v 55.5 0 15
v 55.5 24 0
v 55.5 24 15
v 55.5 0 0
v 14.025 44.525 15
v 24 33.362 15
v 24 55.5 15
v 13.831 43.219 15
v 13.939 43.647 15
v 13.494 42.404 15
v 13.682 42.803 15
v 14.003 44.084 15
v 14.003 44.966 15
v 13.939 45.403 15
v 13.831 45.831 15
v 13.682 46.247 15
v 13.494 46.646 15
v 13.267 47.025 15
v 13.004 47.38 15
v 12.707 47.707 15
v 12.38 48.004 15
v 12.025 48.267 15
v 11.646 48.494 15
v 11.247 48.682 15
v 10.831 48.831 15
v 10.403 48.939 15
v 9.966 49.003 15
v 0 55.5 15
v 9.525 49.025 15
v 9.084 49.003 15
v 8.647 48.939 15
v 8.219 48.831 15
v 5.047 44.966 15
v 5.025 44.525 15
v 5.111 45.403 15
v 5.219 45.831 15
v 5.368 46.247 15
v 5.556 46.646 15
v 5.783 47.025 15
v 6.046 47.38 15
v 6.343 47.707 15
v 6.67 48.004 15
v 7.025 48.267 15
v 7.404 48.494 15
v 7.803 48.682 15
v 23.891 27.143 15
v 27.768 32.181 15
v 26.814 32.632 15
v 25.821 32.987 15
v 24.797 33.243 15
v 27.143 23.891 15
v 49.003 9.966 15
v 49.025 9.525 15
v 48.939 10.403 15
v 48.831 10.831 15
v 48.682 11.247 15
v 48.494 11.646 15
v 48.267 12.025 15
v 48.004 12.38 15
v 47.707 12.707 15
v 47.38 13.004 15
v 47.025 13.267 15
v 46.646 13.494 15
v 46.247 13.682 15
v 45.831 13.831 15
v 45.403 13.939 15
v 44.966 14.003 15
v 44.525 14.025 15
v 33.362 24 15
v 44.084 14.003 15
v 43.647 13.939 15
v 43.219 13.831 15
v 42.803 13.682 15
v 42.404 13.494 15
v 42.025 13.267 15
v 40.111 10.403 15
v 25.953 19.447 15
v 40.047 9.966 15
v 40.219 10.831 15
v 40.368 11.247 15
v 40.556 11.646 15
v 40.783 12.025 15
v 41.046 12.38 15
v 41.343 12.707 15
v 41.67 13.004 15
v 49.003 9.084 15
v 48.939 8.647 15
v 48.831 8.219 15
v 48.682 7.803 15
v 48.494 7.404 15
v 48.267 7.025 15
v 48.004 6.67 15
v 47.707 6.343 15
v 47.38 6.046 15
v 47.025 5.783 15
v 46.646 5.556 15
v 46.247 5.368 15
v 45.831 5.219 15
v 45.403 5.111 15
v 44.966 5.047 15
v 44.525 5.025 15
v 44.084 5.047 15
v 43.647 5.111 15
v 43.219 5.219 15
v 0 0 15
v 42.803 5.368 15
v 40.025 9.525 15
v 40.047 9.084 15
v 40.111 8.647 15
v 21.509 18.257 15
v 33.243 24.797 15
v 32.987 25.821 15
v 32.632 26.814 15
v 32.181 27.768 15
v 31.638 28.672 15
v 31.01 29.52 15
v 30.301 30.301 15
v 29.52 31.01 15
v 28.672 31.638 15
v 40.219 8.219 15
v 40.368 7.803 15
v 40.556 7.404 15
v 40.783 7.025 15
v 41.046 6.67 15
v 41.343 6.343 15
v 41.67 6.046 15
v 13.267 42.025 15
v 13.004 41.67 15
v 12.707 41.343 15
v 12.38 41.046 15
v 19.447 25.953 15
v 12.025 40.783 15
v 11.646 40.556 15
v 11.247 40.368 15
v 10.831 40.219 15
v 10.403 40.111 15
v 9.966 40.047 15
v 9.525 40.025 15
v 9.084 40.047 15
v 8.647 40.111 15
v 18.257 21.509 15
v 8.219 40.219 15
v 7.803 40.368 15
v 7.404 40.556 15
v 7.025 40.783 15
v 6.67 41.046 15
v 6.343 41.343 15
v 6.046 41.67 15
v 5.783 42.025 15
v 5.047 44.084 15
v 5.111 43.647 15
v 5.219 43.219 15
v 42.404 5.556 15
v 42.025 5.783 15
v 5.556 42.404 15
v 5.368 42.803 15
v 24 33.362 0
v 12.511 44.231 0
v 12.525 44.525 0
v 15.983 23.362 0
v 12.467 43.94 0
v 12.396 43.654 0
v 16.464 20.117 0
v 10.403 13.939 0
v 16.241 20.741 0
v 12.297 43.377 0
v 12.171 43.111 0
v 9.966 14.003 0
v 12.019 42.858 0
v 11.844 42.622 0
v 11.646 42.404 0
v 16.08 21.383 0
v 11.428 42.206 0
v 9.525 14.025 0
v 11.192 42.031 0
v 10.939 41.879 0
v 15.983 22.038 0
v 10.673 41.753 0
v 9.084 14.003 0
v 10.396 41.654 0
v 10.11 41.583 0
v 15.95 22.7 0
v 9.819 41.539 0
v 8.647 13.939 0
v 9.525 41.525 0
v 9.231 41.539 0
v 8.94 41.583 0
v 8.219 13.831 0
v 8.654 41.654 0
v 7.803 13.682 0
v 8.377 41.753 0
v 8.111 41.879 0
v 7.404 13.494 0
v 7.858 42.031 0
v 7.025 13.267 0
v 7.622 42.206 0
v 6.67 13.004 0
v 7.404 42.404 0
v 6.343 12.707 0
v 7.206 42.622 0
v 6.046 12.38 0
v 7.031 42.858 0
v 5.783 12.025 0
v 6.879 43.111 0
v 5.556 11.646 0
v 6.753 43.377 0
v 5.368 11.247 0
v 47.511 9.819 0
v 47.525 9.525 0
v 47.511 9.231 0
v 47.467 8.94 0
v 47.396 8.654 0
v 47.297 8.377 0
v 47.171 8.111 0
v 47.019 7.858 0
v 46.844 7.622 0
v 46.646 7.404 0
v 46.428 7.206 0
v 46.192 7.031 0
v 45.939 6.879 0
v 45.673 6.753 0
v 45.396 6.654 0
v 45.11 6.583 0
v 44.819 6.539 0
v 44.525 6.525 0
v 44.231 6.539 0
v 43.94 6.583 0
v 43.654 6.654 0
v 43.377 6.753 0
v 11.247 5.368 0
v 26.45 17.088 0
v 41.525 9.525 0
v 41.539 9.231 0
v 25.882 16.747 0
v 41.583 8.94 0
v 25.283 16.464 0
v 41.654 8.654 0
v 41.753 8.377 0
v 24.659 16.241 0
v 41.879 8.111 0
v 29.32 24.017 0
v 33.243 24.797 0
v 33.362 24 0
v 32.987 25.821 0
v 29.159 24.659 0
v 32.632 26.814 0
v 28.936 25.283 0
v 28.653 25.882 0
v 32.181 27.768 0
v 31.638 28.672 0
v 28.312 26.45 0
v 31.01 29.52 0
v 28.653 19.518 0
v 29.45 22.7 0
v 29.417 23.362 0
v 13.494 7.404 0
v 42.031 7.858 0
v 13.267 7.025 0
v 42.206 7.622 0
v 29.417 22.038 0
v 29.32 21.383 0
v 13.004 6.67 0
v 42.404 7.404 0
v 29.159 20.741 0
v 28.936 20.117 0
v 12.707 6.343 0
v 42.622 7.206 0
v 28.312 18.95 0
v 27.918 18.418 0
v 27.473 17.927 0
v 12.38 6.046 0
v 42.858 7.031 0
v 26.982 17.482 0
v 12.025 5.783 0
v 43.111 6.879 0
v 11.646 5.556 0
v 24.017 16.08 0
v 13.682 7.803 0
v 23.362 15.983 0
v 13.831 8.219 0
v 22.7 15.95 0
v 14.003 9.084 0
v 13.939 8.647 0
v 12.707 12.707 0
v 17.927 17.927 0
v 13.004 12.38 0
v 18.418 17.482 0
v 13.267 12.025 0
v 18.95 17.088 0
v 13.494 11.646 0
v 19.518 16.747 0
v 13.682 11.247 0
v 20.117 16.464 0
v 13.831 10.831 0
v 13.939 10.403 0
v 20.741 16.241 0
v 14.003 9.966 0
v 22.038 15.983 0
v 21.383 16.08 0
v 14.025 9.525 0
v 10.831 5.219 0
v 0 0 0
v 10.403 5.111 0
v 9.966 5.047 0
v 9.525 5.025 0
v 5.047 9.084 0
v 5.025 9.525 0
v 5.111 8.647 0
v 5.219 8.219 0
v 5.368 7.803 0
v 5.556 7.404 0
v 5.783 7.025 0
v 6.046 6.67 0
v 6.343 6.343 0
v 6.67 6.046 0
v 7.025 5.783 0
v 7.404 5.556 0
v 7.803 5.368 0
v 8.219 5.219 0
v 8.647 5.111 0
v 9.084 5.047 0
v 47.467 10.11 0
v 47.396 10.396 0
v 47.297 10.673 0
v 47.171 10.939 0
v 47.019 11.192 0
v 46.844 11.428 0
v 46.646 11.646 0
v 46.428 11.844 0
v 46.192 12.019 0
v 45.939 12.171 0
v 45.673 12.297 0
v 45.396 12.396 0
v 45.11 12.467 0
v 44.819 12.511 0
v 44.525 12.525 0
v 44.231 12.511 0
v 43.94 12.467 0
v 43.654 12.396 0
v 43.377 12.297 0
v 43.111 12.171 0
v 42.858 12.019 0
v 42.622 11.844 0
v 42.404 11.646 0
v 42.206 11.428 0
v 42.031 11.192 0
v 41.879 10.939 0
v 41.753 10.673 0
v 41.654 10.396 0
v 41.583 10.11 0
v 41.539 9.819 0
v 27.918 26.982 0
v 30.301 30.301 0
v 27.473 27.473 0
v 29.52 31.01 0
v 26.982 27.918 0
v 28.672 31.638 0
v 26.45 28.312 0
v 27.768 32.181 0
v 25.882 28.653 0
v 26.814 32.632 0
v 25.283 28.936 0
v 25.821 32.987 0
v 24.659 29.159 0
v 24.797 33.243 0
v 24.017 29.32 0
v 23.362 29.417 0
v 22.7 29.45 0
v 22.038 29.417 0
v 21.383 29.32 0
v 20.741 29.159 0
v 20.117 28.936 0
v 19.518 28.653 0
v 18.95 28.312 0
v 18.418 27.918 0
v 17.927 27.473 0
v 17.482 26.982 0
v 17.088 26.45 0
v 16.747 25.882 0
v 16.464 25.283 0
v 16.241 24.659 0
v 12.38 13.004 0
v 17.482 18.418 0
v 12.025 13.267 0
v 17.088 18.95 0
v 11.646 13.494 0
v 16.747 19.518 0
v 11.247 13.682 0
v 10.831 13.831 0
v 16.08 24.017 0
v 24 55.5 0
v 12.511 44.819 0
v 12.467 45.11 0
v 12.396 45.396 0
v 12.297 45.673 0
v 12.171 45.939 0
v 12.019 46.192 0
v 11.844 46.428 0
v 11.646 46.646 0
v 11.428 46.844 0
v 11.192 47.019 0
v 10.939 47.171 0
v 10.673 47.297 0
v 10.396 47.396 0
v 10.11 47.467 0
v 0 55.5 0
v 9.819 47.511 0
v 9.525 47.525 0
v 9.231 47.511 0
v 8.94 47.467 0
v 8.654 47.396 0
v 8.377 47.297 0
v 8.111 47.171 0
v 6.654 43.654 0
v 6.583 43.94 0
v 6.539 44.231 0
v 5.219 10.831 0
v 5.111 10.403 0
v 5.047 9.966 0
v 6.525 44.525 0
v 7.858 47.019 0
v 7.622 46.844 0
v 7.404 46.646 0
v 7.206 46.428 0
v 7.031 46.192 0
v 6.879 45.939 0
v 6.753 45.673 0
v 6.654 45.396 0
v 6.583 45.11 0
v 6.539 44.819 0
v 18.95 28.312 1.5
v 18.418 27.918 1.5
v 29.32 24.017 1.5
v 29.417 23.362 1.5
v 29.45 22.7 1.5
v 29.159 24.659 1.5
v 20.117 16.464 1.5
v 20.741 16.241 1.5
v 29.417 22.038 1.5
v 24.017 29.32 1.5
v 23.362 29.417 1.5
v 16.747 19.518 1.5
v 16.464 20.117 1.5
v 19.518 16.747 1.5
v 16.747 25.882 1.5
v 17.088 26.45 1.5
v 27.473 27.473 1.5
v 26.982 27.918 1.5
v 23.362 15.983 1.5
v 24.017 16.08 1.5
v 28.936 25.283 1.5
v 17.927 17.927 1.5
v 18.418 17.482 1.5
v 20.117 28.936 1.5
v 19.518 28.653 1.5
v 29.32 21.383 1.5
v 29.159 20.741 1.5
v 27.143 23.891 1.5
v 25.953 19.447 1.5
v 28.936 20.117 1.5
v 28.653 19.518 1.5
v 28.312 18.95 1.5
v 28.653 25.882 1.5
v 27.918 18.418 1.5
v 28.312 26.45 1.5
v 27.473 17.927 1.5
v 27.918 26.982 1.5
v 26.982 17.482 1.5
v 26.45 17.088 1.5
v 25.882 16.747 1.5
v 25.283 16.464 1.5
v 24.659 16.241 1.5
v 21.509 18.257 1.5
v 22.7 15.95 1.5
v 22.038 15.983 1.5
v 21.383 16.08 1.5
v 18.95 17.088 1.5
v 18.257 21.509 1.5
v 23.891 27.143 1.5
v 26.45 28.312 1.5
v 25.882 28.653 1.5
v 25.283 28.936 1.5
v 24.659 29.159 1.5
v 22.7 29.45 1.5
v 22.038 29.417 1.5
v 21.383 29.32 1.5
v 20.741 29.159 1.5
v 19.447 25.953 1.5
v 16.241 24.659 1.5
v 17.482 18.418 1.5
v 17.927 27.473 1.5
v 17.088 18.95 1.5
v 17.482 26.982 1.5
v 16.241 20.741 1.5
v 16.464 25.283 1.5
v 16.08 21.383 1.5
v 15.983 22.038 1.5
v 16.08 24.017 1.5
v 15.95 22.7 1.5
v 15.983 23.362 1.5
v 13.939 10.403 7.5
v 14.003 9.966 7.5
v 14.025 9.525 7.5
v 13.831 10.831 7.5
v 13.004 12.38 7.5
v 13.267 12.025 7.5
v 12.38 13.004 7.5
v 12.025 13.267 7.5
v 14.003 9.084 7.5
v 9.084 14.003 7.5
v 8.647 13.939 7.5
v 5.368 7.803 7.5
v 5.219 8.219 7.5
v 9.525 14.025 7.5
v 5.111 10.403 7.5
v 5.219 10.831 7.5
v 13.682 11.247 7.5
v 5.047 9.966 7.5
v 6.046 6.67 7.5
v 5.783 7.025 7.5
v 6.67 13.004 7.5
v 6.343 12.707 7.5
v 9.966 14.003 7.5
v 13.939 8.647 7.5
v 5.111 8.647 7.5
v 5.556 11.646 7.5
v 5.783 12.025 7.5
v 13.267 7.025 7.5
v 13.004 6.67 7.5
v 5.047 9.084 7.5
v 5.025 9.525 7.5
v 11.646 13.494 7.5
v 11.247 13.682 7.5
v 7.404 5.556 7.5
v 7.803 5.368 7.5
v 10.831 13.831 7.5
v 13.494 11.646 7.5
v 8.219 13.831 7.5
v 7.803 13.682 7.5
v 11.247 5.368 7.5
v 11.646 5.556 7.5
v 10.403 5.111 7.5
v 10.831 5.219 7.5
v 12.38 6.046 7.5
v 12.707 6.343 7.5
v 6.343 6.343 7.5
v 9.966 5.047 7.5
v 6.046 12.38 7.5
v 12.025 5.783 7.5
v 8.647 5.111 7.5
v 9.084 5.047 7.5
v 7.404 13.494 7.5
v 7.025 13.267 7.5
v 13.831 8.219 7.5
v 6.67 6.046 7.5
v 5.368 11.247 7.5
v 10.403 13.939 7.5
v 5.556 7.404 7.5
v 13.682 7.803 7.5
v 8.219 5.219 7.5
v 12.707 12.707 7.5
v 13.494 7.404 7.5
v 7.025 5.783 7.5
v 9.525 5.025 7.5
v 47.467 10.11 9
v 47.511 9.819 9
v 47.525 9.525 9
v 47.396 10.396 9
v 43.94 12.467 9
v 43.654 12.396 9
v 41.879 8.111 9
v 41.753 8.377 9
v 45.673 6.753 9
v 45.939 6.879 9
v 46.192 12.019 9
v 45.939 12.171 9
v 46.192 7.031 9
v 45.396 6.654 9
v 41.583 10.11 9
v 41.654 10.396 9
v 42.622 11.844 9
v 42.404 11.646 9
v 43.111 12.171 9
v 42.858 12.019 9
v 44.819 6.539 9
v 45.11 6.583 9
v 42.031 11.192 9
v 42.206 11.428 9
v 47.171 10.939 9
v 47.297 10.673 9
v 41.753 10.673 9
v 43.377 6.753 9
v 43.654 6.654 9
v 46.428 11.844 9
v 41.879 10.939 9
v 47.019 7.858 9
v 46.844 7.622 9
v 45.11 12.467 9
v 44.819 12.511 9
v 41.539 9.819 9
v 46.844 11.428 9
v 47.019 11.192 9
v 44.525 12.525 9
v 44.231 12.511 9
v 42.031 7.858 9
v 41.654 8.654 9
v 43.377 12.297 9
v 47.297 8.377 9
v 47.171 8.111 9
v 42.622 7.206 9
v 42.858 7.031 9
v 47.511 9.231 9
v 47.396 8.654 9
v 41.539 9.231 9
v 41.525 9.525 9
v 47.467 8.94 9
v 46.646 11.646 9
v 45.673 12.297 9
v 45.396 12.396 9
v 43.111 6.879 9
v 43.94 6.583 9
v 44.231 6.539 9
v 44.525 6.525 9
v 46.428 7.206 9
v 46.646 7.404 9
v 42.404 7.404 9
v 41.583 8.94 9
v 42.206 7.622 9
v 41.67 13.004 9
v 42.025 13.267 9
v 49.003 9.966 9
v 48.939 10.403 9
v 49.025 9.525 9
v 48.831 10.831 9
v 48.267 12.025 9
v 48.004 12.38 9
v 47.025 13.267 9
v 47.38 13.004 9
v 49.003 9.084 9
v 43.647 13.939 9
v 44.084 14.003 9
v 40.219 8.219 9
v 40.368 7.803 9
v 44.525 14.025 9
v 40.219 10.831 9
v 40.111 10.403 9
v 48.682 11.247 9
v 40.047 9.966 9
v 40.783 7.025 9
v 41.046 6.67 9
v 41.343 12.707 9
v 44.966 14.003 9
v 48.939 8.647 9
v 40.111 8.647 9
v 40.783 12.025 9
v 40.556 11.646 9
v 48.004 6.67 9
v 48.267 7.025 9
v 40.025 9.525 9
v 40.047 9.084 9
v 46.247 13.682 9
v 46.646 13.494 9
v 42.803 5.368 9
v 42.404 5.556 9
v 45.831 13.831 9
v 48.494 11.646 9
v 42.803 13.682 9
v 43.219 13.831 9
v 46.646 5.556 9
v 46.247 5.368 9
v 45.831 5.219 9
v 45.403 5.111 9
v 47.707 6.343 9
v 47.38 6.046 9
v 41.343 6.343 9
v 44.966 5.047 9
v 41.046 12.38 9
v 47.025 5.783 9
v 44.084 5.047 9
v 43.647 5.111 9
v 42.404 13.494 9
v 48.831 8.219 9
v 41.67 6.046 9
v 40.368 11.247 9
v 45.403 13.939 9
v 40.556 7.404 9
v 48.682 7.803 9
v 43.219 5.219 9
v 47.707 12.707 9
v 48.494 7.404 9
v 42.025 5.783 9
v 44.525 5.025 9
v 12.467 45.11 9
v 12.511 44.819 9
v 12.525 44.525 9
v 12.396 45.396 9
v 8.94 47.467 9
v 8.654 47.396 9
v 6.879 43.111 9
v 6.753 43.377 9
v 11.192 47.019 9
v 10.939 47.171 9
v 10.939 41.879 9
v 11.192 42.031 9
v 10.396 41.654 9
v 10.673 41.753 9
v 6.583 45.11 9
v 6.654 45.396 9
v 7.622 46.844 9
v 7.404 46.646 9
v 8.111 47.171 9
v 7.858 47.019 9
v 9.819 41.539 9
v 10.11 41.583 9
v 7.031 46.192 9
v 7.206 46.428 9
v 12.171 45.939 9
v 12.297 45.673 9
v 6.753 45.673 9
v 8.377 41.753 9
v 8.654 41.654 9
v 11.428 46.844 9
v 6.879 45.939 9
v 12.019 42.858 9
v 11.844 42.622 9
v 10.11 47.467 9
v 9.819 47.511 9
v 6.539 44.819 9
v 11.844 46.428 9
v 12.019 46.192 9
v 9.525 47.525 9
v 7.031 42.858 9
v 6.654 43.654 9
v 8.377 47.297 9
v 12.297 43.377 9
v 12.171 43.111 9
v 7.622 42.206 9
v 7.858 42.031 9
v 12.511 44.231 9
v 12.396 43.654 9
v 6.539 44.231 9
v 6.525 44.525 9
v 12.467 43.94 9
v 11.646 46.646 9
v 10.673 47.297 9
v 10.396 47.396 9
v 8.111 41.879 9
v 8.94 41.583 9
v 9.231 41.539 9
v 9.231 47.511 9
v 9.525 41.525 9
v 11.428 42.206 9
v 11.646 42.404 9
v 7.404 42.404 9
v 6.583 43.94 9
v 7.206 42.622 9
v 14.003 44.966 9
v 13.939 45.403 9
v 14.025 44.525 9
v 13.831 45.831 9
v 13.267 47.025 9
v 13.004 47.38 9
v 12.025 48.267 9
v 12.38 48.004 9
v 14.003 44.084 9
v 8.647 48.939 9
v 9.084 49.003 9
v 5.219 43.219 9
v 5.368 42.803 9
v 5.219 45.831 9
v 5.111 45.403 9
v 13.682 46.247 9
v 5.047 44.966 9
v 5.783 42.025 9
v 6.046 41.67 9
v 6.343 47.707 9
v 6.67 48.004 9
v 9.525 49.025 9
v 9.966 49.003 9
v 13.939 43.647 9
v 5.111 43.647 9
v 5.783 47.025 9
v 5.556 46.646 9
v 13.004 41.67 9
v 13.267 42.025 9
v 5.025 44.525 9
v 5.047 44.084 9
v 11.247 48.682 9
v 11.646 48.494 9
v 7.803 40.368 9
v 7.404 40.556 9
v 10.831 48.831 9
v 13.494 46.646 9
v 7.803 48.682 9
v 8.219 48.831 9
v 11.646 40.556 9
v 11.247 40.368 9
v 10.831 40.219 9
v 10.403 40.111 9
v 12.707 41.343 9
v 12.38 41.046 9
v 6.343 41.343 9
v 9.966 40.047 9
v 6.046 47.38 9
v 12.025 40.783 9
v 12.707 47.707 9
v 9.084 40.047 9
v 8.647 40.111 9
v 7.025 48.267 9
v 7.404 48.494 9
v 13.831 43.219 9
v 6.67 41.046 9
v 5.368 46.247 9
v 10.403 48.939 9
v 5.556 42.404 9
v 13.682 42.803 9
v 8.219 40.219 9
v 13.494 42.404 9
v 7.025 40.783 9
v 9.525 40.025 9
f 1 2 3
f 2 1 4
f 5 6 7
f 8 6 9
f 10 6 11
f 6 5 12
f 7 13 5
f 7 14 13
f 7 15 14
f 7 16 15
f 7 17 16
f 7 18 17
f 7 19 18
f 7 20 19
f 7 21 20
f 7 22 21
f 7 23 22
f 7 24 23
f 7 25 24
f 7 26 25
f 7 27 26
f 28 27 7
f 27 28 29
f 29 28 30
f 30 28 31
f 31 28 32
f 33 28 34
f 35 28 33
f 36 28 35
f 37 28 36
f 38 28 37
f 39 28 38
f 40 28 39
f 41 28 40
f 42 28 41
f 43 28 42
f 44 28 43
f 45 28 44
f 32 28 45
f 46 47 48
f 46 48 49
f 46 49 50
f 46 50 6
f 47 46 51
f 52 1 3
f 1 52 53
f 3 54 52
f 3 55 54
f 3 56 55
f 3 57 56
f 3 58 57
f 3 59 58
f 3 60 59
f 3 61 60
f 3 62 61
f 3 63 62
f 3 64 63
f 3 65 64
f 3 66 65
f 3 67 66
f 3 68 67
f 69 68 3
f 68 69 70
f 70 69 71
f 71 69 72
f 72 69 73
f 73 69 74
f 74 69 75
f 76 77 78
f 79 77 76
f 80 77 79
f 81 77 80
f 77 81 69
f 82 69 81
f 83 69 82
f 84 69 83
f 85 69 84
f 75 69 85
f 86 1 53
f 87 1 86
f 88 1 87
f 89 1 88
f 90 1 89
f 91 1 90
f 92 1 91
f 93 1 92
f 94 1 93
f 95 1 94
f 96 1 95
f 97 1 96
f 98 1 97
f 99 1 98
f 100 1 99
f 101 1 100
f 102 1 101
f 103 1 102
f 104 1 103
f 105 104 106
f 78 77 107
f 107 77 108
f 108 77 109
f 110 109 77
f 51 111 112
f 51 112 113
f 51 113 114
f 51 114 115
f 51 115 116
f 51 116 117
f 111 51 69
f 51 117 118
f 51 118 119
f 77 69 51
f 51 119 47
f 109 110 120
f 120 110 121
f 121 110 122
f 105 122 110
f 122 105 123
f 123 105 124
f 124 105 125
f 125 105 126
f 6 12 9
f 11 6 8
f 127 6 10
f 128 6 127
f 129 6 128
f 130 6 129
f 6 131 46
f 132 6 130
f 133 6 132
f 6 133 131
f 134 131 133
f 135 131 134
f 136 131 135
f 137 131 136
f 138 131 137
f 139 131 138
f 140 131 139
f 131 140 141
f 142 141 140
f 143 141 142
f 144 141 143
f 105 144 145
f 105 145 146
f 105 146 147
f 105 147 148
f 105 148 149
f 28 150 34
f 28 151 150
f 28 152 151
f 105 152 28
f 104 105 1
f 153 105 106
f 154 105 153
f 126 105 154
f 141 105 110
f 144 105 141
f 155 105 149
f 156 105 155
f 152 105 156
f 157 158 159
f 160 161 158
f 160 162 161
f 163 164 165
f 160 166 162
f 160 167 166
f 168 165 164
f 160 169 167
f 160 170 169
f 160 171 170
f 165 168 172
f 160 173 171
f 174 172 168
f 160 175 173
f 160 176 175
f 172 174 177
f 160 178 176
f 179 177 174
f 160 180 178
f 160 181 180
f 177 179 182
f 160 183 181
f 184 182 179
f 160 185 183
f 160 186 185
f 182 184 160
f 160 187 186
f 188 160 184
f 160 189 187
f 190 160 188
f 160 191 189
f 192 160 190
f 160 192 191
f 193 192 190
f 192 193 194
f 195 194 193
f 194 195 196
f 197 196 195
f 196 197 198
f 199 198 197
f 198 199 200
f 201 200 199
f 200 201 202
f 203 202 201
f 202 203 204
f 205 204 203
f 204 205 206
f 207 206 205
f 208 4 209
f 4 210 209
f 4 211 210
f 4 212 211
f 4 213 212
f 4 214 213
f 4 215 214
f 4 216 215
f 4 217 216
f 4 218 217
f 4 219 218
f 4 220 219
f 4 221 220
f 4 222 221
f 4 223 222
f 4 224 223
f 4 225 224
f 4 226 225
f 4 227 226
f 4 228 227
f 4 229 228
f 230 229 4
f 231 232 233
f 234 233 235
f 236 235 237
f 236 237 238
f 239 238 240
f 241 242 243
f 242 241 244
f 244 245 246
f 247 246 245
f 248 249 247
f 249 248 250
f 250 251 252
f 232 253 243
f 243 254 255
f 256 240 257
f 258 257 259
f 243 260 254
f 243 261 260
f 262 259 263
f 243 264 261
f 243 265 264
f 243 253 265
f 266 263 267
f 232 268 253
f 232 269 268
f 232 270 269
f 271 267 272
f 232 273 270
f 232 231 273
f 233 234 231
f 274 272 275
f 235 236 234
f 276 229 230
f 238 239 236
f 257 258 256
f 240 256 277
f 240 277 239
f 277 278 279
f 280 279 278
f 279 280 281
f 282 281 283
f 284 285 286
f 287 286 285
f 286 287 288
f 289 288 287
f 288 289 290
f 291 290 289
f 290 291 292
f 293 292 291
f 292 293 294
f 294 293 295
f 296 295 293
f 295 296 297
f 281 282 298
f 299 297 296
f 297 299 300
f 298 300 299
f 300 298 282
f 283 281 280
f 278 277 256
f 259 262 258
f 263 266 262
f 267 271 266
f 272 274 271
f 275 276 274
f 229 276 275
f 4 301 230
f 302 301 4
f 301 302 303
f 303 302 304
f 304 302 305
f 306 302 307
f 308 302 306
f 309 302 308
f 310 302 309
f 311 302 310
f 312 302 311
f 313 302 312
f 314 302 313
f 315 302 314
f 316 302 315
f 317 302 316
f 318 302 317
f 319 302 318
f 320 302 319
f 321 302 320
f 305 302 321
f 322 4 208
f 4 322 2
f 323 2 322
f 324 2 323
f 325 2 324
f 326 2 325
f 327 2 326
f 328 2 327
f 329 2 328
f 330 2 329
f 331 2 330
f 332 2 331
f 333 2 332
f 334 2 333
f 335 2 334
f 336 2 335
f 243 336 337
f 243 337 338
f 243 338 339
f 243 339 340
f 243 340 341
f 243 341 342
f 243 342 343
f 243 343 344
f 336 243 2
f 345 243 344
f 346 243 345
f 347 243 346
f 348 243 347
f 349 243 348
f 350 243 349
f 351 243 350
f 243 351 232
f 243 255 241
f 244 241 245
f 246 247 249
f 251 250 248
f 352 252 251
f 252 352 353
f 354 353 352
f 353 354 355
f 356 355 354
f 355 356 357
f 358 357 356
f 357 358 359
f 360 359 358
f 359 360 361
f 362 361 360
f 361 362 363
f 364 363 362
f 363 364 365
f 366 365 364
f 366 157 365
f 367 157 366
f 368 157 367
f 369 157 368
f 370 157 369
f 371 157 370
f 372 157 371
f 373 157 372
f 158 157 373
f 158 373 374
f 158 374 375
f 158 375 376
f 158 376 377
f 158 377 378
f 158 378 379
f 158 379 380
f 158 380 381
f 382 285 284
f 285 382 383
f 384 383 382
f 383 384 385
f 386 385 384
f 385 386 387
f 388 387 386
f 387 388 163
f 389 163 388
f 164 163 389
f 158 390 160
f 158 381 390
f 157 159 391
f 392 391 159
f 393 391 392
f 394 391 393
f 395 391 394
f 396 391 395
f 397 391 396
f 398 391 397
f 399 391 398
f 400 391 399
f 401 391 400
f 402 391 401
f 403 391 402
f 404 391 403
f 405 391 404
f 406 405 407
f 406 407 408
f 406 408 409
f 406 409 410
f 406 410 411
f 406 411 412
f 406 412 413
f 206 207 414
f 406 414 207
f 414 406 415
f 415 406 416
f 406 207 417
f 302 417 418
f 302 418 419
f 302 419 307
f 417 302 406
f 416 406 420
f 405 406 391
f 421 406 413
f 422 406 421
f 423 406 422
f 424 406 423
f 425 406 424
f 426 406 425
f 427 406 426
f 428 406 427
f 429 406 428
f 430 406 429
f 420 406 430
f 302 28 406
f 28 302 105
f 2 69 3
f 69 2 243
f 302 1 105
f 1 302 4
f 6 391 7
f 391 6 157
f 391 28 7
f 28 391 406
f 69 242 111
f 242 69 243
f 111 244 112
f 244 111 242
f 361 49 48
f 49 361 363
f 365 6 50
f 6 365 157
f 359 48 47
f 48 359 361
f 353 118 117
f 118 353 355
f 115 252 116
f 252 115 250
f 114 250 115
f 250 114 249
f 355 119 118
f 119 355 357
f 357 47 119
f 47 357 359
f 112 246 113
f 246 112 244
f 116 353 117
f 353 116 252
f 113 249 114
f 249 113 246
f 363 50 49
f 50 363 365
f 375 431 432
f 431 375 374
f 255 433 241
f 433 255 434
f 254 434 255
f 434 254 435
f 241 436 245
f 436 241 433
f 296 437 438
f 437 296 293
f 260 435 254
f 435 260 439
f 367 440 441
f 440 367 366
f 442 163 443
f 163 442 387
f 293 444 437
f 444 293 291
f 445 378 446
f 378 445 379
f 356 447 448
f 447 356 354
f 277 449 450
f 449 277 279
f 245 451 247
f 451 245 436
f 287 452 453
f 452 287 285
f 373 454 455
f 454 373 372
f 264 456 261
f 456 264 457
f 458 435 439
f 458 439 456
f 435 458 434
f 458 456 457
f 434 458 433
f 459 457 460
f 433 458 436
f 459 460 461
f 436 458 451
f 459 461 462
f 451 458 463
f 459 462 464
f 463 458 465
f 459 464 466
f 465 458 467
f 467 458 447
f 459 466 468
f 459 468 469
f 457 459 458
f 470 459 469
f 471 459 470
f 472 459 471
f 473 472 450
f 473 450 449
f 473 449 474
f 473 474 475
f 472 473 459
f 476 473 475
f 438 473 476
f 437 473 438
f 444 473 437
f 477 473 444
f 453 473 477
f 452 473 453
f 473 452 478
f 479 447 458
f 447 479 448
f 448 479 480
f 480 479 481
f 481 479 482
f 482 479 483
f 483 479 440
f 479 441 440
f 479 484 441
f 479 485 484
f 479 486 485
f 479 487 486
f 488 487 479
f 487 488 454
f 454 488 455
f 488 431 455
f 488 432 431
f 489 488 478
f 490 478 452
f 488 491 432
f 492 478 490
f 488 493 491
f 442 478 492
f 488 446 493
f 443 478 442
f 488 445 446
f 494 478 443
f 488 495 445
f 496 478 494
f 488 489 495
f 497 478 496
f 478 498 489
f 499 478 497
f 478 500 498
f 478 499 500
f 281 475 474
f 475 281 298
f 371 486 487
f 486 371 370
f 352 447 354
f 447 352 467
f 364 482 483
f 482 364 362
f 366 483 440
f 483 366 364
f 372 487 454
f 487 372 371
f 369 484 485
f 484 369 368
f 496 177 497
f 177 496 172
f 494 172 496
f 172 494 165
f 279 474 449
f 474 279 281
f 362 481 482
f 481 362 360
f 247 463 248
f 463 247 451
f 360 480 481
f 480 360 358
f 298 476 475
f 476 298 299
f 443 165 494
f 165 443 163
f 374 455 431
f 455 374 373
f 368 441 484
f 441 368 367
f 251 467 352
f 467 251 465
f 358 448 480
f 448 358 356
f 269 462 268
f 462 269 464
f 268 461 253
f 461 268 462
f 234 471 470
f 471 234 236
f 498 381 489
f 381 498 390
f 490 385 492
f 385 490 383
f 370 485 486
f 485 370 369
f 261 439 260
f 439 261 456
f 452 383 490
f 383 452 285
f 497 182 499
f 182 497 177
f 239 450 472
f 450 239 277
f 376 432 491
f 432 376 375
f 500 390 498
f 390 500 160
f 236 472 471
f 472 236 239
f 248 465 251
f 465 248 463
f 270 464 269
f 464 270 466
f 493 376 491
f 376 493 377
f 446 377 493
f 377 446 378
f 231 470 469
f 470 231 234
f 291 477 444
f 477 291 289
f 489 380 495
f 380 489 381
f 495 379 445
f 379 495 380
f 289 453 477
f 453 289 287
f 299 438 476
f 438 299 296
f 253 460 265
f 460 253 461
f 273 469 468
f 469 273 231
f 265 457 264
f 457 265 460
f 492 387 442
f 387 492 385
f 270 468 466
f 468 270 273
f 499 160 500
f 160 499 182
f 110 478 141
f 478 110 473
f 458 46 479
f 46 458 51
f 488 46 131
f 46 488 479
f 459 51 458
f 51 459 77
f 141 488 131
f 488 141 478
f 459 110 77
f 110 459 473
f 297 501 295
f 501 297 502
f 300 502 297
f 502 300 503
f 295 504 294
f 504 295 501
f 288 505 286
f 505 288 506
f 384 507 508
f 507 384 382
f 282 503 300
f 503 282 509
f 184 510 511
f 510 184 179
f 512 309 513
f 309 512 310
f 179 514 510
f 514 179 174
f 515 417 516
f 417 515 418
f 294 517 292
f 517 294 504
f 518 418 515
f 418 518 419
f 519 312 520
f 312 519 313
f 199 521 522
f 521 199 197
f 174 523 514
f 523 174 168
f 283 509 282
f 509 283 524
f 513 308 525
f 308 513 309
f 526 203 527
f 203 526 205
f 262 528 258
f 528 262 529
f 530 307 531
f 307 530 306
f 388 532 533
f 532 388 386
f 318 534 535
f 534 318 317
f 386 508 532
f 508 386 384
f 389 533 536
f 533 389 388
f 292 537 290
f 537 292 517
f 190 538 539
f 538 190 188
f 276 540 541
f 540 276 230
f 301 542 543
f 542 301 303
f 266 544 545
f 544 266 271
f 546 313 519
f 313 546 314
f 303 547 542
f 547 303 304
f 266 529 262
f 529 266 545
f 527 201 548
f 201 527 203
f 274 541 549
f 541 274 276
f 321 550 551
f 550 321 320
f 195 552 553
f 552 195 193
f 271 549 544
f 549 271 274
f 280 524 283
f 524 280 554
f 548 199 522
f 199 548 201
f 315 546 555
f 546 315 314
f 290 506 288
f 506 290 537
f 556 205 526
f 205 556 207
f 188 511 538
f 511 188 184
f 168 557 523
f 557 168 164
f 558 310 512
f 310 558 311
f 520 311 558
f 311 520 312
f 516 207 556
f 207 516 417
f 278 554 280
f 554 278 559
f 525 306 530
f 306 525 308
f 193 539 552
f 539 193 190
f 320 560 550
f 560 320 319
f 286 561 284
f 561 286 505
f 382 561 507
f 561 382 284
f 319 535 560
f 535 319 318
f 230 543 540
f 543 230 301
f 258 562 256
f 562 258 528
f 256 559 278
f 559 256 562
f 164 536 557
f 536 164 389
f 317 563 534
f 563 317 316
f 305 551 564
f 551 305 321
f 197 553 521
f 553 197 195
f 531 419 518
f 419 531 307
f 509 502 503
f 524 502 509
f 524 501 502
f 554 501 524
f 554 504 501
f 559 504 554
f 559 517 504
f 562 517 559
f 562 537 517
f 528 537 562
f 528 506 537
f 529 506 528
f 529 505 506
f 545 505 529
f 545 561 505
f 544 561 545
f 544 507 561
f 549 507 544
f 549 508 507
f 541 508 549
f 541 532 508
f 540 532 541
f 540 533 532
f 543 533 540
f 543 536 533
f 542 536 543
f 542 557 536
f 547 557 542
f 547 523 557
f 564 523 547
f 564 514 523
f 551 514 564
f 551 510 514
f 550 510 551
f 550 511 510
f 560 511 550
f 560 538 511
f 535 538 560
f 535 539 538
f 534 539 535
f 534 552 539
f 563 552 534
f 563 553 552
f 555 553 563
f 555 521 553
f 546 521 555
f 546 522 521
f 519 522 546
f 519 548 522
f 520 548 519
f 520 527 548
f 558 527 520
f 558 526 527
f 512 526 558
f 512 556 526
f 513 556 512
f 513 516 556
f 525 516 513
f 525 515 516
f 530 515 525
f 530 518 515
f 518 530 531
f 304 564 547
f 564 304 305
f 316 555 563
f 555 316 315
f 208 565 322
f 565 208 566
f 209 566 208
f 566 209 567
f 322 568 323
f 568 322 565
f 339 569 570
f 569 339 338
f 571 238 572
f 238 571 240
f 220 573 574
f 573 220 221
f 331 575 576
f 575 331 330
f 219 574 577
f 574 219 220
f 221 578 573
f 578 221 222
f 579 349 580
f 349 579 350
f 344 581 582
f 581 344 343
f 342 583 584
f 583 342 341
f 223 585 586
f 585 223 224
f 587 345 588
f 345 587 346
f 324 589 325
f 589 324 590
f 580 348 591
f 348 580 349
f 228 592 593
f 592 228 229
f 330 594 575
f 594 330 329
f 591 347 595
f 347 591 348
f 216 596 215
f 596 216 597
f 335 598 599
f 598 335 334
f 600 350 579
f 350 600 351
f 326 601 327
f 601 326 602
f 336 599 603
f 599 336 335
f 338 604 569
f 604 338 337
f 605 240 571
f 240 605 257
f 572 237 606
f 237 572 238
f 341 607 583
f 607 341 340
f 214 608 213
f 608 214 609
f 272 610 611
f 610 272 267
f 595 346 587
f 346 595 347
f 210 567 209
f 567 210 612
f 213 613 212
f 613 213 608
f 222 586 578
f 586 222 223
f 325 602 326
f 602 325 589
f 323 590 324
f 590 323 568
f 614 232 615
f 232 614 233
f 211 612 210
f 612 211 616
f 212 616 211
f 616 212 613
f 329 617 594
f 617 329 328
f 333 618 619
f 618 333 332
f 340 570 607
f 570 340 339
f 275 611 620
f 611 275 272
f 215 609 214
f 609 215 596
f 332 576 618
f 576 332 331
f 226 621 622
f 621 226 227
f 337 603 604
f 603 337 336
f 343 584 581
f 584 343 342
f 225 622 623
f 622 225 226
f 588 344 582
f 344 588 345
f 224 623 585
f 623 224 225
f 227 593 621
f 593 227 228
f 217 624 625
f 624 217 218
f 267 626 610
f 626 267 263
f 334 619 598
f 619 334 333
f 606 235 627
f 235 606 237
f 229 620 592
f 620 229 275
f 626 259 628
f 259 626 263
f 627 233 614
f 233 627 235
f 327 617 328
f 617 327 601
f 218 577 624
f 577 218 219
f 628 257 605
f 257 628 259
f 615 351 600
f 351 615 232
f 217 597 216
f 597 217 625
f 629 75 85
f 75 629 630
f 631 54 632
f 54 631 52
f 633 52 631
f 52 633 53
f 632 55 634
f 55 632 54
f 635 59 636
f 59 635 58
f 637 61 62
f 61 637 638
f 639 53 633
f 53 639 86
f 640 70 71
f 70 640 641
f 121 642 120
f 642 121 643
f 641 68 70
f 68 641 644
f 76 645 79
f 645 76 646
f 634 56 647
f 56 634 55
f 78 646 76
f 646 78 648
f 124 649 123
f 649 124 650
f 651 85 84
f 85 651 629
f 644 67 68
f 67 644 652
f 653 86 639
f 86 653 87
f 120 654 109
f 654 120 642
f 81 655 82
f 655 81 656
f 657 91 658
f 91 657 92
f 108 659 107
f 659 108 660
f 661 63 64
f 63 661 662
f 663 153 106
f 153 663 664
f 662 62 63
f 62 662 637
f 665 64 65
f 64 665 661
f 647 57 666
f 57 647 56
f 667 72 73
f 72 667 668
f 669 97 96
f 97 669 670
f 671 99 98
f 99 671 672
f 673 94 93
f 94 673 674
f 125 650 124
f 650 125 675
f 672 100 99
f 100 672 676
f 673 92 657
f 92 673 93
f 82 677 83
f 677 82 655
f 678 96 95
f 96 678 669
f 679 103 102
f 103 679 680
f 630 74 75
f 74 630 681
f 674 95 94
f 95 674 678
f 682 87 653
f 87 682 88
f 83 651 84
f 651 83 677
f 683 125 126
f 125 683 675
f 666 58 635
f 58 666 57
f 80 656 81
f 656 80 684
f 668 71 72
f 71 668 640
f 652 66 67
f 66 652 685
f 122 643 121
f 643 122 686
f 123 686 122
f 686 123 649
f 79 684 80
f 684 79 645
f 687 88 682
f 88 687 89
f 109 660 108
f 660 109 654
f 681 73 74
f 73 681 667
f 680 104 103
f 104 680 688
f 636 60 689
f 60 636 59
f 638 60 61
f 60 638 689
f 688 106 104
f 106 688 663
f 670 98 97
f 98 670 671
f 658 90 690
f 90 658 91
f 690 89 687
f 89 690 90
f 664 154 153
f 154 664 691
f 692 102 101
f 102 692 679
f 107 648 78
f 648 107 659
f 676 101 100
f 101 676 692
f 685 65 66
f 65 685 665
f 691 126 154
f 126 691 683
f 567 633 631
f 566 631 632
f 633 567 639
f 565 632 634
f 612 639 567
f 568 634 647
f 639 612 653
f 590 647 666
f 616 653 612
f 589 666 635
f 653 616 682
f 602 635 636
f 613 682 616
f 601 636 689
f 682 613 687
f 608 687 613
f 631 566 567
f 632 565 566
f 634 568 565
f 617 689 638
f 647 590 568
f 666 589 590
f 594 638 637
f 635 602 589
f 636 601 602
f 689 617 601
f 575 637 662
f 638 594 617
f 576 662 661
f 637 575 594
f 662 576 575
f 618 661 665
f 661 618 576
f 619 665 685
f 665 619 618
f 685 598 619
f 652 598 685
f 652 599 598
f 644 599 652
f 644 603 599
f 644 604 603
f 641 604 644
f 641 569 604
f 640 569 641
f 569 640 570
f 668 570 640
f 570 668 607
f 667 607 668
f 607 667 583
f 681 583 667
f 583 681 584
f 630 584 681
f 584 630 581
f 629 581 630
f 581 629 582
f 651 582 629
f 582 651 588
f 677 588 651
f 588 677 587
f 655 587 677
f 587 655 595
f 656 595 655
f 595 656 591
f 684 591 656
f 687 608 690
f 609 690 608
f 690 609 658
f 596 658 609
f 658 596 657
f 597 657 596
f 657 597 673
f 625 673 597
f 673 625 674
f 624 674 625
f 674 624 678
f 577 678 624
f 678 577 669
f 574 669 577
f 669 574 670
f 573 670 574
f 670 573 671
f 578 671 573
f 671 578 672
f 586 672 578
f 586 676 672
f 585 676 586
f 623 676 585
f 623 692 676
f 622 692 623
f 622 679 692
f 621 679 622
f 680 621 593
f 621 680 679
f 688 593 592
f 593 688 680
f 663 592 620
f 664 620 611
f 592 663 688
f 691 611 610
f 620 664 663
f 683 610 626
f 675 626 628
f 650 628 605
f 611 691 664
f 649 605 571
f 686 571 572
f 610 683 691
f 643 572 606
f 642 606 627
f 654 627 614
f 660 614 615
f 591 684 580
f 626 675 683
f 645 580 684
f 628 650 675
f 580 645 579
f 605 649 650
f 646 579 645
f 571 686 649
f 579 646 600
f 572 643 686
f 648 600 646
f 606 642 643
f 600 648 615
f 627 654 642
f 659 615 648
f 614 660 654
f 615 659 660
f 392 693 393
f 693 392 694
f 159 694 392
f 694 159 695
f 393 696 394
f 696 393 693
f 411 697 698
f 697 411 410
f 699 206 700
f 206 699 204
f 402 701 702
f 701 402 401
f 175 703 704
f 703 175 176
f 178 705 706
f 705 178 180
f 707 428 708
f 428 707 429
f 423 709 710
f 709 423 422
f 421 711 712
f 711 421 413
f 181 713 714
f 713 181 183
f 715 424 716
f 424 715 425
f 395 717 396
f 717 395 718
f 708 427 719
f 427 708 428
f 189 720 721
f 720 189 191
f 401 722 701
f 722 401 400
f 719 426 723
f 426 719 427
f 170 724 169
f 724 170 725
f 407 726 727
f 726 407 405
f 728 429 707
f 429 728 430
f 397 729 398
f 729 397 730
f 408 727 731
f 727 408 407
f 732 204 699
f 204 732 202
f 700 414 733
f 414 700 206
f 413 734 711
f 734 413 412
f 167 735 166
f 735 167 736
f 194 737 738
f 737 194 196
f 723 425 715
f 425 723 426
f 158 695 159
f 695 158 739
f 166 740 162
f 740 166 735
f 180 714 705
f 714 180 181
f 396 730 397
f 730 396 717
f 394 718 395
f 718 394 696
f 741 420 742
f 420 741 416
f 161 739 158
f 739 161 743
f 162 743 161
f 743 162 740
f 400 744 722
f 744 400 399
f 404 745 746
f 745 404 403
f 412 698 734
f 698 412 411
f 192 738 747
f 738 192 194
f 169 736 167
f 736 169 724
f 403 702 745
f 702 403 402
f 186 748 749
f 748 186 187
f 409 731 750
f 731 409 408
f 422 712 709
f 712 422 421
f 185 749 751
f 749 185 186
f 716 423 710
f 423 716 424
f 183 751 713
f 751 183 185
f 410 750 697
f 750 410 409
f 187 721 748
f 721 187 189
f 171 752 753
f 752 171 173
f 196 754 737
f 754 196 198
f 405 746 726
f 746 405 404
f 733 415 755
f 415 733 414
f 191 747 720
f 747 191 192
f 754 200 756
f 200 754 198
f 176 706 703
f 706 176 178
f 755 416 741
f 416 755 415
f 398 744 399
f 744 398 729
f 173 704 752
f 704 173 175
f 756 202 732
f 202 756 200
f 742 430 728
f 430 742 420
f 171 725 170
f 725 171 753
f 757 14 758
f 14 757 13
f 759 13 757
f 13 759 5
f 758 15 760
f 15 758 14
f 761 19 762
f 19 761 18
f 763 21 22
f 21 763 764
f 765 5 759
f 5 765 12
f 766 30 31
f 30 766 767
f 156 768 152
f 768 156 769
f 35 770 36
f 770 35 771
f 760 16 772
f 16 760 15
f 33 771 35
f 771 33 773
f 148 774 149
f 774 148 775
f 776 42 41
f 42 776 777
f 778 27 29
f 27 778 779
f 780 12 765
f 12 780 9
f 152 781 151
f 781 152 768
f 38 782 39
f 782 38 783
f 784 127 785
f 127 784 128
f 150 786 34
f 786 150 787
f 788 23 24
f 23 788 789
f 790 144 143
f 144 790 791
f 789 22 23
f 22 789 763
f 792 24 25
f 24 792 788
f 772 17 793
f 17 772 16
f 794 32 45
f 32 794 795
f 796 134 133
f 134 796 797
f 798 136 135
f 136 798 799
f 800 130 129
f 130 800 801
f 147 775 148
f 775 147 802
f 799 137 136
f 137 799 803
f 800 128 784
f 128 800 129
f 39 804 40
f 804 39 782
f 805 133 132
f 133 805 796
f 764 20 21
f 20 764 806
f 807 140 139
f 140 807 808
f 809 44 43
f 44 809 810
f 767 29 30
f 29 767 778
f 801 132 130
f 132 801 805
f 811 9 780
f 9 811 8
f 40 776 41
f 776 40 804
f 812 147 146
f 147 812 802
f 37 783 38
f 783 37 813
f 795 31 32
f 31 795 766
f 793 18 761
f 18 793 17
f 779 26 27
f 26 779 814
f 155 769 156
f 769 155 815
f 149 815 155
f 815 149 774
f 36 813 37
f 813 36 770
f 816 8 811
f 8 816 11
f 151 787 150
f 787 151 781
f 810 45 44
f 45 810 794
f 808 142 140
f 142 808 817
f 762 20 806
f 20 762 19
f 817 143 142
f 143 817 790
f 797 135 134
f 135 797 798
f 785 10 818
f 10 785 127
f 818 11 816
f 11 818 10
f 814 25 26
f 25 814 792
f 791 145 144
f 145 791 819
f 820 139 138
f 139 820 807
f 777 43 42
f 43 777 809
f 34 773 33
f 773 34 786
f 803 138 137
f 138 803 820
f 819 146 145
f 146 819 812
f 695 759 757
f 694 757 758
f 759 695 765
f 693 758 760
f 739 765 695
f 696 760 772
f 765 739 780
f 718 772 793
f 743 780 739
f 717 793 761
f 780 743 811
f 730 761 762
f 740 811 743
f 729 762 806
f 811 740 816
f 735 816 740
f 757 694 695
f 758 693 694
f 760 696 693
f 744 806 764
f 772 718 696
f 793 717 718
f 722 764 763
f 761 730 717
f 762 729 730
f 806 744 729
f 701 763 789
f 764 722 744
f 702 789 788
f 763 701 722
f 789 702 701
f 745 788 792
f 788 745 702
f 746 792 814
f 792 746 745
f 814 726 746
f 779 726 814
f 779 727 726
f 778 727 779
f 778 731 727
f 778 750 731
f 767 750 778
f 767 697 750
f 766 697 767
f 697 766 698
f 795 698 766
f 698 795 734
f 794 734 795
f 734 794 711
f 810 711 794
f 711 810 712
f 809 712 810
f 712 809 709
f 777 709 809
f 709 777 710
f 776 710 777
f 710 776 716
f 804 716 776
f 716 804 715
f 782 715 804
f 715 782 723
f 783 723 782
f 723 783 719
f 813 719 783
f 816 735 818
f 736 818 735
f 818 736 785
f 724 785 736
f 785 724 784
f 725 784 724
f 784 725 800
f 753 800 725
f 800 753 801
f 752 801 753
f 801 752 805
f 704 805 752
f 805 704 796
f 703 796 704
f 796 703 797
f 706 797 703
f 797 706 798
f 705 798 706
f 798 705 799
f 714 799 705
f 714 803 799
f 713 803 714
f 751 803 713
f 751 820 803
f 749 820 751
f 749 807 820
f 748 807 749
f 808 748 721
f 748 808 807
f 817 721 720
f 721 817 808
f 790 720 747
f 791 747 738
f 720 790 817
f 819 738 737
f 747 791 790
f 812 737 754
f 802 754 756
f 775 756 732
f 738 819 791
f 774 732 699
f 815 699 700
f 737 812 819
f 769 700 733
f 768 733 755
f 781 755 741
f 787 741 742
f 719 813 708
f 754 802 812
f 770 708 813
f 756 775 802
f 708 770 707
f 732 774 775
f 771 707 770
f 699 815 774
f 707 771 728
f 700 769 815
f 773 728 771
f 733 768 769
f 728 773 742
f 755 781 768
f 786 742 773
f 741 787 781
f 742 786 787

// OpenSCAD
// Corner bracket replacement piece
// Adjust these constants to fit your frame

arm_length       = 55.5;  // length of each arm of the L
arm_width        = 24.0;  // width of each arm
height           = 15.0;  // protruding corner height (not full frame thickness)

// Hole positions measured from the piece's outer corner face
// (= frame inner wall face, since piece sits inside 1.5mm frame walls)
// C_Frame_AC_Accurate: holes at 24.0mm from frame outer edge → 24.0-1.5 = 22.5mm from inner face ≈ 22.7mm panel hole
spacer_from_outer = 22.7;  // panel screw / spacer center — matches panel hole offset
pad_from_outer    = 9.525; // pad-to-frame screw center (outer of the two, from C_Frame: 9.5mm from inner wall face)

// Rivet nut specs (M6, hex body, flange at bottom)
rivet_flange_od  = 13.5;  // flange outer diameter
rivet_flange_h   = 1.5;   // flange thickness (estimate — measure and tune)
rivet_body_od    = 8.8;   // hex body OD (across corners)
rivet_total_h    = 15.0;  // total height (flange + body)
rivet_clearance  = 0.4;   // extra clearance on body for press fit

// Pad-to-frame screw half-hole
pad_screw_dia   = 9;      // diameter
half_hole_depth = height / 2;

// Side frame-mount holes (one per arm, stepped for M5 screw + head pocket)
side_hole_spacing = 35;   // center-to-center from pad hole
side_thread_dia   = 6;    // bottom/through part (screw thread clearance)
side_head_dia     = 9;    // top counterbore for screw head
side_head_depth   = 6;    // counterbore depth from top (tunable)

// Derived
spacer_cx = spacer_from_outer;
spacer_cy = spacer_from_outer;
pad_cx    = pad_from_outer;
pad_cy    = pad_from_outer;
side_x_cx = pad_cx + side_hole_spacing;
side_x_cy = pad_cy;
side_y_cx = pad_cx;
side_y_cy = pad_cy + side_hole_spacing;

$fn = 64;

module corner_piece() {
    difference() {
        // L-shape body + reinforcement boss around rivet nut
        union() {
            cube([arm_length, arm_width, height]);
            cube([arm_width, arm_length, height]);
            translate([spacer_cx, spacer_cy, 0])
                cylinder(h = height, d = rivet_flange_od + 8);
        }

        // Rivet nut flange recess (bottom face)
        translate([spacer_cx, spacer_cy, -0.1])
            cylinder(h = rivet_flange_h + 0.1, d = rivet_flange_od);

        // Rivet nut body hole — hex, full remaining height, rotated 45°
        translate([spacer_cx, spacer_cy, rivet_flange_h - 0.1])
            rotate([0, 0, -45])
            cylinder(h = rivet_total_h - rivet_flange_h + 0.2,
                     d = rivet_body_od + rivet_clearance, $fn = 6);

        // Pad-to-frame half-hole (blind from bottom)
        translate([pad_cx, pad_cy, -0.1])
            cylinder(h = half_hole_depth + 0.1, r = pad_screw_dia/2);

        // Side hole on X arm: 6mm through + 9mm top counterbore
        translate([side_x_cx, side_x_cy, -0.1])
            cylinder(h = height + 0.2, r = side_thread_dia/2);
        translate([side_x_cx, side_x_cy, height - side_head_depth])
            cylinder(h = side_head_depth + 0.1, r = side_head_dia/2);

        // Side hole on Y arm: 6mm through + 9mm top counterbore
        translate([side_y_cx, side_y_cy, -0.1])
            cylinder(h = height + 0.2, r = side_thread_dia/2);
        translate([side_y_cx, side_y_cy, height - side_head_depth])
            cylinder(h = side_head_depth + 0.1, r = side_head_dia/2);
    }
}

corner_piece();
